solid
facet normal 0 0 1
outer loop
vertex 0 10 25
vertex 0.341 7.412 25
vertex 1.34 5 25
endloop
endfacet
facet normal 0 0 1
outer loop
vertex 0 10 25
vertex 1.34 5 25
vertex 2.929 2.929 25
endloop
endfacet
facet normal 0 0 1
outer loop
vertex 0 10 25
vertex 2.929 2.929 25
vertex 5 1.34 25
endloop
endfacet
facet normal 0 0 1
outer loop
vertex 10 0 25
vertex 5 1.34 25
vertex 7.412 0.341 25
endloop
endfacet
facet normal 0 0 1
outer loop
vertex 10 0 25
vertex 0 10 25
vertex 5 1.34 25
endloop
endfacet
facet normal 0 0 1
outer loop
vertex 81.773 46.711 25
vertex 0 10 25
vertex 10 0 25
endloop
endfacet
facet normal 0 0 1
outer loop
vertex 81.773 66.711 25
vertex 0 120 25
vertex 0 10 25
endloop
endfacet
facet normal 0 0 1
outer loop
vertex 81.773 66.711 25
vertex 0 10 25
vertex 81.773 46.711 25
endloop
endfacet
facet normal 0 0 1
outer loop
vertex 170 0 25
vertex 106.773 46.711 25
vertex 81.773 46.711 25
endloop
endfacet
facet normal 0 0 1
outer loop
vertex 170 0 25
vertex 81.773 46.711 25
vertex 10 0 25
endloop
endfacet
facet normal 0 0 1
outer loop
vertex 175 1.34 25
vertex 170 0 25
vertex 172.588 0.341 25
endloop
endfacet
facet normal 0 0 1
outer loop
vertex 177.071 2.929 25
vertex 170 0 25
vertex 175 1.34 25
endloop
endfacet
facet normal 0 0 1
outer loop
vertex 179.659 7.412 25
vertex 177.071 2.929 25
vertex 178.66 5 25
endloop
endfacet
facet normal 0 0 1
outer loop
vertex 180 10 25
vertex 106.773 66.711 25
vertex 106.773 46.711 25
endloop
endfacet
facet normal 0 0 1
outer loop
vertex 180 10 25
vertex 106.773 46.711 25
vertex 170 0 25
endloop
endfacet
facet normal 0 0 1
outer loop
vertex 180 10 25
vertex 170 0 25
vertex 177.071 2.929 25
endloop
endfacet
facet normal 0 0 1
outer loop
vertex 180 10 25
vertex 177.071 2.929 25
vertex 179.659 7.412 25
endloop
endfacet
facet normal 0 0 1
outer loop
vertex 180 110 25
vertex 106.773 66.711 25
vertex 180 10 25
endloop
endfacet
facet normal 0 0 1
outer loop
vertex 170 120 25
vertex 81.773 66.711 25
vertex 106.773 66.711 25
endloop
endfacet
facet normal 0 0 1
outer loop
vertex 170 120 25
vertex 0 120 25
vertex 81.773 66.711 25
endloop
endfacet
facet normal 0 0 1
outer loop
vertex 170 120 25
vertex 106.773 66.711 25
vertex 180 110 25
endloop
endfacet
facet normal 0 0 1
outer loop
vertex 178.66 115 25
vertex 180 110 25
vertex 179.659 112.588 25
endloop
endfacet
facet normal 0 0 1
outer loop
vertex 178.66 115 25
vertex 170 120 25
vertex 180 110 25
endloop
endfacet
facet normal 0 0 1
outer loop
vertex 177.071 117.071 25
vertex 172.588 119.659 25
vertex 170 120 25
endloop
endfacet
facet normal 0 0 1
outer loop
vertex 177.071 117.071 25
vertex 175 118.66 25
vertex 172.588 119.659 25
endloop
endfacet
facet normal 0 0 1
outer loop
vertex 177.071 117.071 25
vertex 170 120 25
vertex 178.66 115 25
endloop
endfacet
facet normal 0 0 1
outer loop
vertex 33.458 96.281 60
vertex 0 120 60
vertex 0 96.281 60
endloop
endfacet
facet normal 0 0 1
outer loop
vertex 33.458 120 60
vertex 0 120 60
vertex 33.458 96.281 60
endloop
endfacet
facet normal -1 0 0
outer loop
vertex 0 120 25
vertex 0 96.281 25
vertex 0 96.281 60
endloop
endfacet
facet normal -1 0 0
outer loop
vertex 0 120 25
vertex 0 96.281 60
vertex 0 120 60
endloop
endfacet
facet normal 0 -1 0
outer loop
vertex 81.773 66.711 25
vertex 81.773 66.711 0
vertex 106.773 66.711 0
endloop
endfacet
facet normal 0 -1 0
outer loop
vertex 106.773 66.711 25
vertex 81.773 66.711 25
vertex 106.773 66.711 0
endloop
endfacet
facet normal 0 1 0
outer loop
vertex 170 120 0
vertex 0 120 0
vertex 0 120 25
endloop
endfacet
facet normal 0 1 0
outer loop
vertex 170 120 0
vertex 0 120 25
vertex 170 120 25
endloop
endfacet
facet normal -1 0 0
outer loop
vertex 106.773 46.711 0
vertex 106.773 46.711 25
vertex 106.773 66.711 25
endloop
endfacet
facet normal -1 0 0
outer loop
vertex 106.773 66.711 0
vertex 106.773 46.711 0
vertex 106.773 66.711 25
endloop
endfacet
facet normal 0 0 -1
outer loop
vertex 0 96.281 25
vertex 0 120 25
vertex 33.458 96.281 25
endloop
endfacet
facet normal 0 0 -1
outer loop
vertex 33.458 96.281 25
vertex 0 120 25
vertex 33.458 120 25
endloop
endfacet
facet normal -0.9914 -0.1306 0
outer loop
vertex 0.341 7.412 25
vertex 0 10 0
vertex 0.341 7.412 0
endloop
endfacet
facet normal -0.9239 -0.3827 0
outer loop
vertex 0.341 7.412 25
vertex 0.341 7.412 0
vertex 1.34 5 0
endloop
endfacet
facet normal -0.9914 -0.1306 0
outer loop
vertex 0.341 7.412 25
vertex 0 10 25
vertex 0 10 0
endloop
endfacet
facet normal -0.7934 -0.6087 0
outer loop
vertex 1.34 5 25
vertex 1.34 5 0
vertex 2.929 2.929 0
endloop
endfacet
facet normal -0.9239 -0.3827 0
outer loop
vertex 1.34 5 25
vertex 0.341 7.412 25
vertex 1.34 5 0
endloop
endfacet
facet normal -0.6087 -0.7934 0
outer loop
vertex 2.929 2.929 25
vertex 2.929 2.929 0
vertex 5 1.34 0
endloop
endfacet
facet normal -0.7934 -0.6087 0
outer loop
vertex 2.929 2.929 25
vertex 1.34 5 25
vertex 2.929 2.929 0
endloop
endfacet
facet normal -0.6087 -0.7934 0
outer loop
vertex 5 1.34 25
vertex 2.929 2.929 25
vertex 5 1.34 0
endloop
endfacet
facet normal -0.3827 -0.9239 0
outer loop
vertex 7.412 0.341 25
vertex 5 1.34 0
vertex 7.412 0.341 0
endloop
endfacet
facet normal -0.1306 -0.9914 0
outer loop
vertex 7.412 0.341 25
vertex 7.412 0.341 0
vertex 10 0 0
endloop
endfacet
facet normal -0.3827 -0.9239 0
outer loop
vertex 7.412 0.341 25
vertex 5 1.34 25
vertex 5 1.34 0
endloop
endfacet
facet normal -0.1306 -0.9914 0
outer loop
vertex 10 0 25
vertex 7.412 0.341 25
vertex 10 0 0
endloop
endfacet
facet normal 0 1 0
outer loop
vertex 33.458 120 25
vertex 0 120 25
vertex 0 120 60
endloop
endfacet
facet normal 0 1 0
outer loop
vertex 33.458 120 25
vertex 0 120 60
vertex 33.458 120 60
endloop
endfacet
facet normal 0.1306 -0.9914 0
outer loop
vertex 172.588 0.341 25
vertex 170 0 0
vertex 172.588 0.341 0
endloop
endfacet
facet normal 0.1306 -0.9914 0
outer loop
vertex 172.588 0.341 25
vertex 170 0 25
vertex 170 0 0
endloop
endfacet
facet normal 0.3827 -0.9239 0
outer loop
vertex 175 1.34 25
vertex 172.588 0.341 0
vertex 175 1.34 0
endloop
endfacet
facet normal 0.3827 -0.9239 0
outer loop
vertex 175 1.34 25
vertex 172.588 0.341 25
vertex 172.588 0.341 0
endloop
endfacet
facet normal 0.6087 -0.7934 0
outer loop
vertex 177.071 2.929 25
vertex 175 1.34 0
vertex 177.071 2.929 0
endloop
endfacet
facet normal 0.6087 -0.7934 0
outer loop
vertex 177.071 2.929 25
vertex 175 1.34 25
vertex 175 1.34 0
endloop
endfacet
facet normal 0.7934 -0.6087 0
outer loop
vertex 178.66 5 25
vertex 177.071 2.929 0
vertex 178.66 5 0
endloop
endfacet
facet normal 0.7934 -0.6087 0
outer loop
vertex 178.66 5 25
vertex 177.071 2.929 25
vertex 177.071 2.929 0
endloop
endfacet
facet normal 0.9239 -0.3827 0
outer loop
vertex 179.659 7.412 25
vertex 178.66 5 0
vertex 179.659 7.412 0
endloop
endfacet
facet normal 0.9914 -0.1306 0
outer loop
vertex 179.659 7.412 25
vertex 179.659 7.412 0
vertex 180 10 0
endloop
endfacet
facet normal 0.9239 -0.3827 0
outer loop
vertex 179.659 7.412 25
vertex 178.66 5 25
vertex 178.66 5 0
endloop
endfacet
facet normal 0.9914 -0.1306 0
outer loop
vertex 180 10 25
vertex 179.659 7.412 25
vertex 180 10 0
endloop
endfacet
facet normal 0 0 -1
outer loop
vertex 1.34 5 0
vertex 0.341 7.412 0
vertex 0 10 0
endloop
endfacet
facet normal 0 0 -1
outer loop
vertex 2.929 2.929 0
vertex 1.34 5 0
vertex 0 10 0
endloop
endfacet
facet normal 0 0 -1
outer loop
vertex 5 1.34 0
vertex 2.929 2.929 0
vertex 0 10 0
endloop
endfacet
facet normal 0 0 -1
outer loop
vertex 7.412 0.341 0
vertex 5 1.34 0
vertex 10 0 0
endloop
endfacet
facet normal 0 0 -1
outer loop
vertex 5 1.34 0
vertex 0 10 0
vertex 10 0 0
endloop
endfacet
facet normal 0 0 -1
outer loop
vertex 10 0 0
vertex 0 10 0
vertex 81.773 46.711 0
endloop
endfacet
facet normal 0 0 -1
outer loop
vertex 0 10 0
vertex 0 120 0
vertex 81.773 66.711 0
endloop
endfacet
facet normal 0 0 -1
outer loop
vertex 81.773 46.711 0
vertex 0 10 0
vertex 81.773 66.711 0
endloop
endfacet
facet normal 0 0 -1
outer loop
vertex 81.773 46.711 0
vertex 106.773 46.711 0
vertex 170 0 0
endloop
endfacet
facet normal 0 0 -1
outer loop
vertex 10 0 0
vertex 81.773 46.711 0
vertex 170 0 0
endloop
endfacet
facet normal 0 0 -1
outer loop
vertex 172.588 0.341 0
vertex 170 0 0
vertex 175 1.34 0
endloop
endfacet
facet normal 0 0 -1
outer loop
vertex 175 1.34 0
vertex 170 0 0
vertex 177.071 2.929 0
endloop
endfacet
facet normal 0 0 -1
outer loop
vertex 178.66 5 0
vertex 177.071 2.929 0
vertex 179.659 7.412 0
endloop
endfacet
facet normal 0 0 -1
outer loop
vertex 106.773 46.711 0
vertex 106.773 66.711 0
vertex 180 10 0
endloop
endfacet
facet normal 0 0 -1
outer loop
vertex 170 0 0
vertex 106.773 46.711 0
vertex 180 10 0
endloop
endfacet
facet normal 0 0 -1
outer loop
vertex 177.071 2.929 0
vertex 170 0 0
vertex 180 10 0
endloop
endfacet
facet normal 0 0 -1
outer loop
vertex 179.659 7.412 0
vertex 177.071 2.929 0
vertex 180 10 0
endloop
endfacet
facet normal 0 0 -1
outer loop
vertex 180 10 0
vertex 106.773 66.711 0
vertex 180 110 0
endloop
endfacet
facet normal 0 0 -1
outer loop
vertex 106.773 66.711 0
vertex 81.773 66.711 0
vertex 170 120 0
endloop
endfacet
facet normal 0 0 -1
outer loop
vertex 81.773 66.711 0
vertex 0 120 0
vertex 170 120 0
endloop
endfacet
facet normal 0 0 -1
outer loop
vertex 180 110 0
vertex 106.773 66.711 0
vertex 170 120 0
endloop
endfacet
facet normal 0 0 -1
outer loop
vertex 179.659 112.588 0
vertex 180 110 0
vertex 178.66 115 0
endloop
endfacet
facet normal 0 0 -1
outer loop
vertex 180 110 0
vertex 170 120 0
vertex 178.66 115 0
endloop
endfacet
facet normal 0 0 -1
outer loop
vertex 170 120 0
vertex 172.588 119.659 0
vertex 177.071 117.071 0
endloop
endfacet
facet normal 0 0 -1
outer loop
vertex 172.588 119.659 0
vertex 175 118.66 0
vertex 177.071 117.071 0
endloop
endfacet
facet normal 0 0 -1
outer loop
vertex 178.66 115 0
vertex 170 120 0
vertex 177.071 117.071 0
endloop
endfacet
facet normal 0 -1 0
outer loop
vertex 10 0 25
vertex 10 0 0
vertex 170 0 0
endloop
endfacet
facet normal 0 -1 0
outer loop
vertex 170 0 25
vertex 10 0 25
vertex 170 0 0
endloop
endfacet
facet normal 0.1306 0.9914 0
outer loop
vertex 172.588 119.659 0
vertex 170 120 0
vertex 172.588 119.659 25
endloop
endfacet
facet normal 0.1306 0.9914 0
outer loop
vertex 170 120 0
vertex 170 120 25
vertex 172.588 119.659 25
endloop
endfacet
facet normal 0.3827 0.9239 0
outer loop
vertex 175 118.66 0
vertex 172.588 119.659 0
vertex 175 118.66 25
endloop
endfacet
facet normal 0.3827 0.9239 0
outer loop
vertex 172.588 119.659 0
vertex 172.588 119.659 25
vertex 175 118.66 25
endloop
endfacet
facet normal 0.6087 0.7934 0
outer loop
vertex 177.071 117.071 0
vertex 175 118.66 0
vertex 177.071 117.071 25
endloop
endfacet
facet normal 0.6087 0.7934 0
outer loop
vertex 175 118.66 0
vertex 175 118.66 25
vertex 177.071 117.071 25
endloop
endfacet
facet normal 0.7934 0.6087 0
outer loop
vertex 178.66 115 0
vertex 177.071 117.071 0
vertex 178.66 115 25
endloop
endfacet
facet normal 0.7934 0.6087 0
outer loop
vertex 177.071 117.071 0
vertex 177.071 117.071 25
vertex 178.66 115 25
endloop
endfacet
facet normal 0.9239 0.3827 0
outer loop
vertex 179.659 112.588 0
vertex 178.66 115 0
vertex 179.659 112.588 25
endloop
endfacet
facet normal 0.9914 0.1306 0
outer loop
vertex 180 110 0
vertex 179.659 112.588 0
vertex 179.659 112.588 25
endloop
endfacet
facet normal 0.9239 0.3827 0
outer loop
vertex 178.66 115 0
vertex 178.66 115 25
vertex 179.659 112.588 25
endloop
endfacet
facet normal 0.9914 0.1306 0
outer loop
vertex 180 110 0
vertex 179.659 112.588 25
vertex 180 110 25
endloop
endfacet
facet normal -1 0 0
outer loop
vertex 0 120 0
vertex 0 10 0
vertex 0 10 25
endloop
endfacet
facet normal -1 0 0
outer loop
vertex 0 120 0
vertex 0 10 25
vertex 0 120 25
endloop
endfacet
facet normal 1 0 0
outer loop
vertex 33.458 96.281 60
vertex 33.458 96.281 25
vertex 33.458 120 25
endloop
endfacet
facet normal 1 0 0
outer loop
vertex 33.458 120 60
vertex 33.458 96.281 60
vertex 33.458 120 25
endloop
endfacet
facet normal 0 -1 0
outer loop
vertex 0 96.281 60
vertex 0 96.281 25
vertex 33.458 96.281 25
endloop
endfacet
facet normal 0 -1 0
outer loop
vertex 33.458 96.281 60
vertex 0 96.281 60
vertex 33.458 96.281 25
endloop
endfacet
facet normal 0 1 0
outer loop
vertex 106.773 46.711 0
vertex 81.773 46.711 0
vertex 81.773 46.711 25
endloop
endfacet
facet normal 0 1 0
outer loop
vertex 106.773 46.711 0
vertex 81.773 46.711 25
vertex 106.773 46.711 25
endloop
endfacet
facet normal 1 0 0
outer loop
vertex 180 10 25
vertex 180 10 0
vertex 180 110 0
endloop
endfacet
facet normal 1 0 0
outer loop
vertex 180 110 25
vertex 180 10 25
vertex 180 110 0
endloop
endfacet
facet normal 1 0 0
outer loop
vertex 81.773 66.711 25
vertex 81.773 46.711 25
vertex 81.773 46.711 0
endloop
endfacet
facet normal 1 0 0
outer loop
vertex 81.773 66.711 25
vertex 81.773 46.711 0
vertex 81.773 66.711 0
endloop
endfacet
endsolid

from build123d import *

# Parameters (mm, degrees)
SKETCH1_W           = 180
SKETCH1_H           = 120
SKETCH1_W_2         = 25
SKETCH1_H_2         = 20
BOSS_EXTRUDE1_DEPTH = 25
SKETCH2_W           = 33.457845935
SKETCH2_H           = 23.718784475
BOSS_EXTRUDE2_DEPTH = 35
FILLET1_R           = 10


with BuildPart() as part:
    # Sketch1 → Boss-Extrude1 (new body)
    with BuildSketch(Plane.XY):
        with Locations((90, 60)):
            Rectangle(SKETCH1_W, SKETCH1_H)
        with Locations((94.273136822, 56.710774072)):
            Rectangle(SKETCH1_W_2, SKETCH1_H_2, mode=Mode.SUBTRACT)
    extrude(amount=BOSS_EXTRUDE1_DEPTH)

    # Fillet1
    fillet1_edges = [part.edges().sort_by_distance(p)[0] for p in [
        (0, 0, 12.5),
        (180, 0, 12.5),
        (180, 120, 12.5),
    ]]
    fillet(fillet1_edges, radius=FILLET1_R)


with BuildPart() as body_2:
    # Sketch2 → Boss-Extrude2 (new body)
    with BuildSketch(Plane.XY.offset(25)):
        with Locations((16.728922968, 108.140607763)):
            Rectangle(SKETCH2_W, SKETCH2_H)
    extrude(amount=BOSS_EXTRUDE2_DEPTH)


solid = Compound([part.part, body_2.part])
